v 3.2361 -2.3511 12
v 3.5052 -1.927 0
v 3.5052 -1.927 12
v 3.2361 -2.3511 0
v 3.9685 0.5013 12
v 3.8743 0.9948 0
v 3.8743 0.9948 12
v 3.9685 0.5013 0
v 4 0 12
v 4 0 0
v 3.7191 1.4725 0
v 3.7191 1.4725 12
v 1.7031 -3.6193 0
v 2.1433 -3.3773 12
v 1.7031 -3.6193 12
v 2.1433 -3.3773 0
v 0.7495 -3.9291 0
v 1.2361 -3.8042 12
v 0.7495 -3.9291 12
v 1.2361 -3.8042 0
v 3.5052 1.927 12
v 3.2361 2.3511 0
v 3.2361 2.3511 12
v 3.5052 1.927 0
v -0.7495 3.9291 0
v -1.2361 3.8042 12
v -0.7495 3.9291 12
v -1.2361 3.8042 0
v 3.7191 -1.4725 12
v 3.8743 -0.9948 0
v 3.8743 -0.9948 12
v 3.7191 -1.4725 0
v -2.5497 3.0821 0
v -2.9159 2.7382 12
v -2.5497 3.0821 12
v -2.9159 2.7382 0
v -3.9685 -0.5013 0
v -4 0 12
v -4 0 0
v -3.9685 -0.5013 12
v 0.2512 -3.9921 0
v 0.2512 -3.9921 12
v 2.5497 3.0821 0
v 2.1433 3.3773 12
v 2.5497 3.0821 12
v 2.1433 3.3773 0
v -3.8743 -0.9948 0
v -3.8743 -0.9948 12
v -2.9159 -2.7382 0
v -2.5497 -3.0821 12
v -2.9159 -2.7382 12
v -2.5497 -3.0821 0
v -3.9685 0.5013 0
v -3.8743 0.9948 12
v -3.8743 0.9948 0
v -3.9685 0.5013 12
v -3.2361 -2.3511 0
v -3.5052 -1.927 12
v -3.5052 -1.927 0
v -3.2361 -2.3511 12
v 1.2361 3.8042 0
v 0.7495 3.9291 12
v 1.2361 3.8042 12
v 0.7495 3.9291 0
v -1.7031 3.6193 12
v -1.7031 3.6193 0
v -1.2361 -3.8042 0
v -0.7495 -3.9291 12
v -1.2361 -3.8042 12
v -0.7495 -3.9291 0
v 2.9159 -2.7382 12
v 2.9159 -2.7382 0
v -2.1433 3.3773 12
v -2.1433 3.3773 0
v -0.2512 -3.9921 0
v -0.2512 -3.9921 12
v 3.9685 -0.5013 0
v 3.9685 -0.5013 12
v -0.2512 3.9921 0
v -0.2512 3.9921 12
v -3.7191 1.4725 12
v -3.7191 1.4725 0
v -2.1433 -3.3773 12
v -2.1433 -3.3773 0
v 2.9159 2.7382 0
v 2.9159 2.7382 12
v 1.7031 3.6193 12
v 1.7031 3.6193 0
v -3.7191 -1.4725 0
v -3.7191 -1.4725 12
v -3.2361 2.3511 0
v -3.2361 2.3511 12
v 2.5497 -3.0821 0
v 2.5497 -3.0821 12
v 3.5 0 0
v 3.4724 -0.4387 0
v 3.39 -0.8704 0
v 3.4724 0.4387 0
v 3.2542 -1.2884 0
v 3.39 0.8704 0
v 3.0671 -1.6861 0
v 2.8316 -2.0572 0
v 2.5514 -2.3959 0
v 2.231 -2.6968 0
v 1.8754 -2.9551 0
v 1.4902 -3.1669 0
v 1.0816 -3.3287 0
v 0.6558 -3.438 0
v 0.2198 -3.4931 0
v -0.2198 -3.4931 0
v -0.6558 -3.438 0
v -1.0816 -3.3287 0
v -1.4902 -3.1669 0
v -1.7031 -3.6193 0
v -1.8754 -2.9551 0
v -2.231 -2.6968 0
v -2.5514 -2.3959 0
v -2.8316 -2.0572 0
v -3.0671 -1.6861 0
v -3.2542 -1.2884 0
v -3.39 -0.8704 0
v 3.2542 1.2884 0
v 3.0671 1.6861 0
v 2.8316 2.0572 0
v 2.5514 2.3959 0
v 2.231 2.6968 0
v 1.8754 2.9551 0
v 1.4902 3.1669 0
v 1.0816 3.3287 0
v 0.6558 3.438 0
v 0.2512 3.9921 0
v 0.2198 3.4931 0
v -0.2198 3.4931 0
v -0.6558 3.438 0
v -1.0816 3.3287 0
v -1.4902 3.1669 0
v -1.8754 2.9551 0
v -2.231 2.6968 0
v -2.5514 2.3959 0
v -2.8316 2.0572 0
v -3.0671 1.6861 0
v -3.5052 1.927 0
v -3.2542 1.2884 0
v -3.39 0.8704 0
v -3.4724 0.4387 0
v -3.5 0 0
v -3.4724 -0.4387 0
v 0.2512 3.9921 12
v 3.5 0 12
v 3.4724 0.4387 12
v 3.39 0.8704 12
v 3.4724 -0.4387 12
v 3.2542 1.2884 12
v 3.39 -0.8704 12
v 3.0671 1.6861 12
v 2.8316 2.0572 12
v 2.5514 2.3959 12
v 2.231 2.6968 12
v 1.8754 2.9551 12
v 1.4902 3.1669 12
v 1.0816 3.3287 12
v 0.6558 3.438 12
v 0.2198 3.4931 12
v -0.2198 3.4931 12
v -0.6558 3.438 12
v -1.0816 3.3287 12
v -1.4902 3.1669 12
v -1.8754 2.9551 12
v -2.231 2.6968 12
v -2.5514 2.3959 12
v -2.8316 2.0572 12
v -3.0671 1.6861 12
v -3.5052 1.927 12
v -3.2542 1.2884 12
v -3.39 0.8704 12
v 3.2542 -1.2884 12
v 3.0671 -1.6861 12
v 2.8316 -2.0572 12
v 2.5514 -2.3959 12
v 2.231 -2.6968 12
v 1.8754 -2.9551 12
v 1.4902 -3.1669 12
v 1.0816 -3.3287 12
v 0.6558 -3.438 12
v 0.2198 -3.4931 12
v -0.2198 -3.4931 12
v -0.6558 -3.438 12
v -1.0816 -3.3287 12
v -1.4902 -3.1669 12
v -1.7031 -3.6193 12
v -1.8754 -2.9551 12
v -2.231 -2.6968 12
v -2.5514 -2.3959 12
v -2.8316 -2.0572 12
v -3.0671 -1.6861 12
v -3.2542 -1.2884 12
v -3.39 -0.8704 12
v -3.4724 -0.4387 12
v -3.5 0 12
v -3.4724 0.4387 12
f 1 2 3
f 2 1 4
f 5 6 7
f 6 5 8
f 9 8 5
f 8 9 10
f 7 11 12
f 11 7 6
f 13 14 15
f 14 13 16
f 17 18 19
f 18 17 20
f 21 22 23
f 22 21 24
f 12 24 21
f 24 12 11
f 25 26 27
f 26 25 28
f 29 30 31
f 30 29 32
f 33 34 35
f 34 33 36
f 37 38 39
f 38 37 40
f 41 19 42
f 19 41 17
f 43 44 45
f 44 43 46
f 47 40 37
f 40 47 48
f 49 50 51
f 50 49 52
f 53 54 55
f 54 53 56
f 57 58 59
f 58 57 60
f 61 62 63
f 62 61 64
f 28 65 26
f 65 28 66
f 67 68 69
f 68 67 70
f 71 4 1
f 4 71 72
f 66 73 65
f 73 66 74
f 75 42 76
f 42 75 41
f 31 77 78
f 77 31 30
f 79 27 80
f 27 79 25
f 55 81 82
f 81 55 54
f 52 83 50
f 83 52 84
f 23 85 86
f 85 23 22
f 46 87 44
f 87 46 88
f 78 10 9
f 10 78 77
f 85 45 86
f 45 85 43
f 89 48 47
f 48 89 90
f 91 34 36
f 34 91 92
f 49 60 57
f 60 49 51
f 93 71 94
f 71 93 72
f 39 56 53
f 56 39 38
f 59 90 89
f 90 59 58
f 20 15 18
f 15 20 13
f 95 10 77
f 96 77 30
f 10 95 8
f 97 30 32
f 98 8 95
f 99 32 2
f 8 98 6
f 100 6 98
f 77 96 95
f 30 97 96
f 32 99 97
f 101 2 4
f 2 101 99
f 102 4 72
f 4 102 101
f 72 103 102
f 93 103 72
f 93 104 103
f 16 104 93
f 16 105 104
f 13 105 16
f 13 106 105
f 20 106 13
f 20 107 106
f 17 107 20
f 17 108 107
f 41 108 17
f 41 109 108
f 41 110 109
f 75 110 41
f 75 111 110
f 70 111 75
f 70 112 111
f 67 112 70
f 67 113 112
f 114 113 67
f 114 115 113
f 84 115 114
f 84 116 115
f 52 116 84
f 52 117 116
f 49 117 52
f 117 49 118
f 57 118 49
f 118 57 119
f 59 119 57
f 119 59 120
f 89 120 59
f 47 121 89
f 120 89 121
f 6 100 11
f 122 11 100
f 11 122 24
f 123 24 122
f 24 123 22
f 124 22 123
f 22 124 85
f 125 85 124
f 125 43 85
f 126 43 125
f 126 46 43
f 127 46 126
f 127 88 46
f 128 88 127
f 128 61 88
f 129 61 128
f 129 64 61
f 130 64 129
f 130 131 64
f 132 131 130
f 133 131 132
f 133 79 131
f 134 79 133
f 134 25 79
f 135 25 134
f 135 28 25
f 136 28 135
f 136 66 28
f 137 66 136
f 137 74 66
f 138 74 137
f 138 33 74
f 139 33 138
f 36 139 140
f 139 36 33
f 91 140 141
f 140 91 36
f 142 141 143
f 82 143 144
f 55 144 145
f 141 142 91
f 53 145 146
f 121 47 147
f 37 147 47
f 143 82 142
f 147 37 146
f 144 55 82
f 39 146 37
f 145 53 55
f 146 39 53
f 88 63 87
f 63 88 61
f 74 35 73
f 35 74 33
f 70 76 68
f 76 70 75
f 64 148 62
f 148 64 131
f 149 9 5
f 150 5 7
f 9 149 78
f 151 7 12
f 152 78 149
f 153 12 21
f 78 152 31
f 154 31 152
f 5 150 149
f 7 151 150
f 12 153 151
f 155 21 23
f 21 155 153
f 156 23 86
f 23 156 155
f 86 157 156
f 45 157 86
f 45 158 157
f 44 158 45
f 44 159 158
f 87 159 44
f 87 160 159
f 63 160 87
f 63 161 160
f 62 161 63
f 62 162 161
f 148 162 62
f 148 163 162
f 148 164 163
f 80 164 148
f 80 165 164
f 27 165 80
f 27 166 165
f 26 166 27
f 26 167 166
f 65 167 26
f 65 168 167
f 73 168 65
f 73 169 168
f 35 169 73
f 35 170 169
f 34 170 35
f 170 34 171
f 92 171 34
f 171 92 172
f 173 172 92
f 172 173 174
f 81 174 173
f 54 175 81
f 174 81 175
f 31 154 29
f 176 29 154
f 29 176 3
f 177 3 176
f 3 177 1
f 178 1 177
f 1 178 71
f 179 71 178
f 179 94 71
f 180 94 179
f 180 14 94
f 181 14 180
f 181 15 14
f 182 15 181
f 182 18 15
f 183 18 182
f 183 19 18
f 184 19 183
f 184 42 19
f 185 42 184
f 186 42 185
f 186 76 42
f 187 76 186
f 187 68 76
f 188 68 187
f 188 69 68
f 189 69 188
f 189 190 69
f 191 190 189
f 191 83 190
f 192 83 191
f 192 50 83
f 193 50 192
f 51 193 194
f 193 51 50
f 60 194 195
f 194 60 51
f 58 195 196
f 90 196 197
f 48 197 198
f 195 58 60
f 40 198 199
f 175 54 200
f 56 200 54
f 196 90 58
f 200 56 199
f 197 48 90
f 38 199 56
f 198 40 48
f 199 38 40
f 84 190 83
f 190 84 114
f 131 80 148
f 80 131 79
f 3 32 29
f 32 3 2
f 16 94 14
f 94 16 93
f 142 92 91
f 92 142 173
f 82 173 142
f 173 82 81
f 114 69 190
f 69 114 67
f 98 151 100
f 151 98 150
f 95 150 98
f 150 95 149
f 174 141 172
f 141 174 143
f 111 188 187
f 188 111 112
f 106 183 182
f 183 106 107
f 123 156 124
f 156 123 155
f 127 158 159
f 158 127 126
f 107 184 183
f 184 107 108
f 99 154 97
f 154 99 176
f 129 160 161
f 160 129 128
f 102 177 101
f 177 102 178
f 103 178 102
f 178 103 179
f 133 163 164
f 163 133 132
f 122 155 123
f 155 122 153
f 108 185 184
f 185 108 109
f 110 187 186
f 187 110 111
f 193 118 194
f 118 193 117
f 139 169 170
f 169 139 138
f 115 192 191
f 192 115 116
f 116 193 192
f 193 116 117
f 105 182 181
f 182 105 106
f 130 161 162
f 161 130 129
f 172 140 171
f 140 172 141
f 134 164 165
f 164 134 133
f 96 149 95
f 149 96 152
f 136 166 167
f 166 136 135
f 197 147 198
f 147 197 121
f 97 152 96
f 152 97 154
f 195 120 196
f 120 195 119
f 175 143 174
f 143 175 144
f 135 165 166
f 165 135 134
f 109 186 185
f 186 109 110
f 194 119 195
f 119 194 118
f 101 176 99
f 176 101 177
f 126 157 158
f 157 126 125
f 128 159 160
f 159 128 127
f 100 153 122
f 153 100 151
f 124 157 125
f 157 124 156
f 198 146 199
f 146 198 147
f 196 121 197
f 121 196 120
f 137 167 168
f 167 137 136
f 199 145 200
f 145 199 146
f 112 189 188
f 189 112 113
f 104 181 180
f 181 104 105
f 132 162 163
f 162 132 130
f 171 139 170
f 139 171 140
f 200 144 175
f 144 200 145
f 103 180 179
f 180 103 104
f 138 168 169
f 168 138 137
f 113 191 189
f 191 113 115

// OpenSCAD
$fn = 50;

difference() {
    cylinder(h=12, r=4);
    translate([0,0,-0.1]) cylinder(h=12.2, r=3.5);
}
